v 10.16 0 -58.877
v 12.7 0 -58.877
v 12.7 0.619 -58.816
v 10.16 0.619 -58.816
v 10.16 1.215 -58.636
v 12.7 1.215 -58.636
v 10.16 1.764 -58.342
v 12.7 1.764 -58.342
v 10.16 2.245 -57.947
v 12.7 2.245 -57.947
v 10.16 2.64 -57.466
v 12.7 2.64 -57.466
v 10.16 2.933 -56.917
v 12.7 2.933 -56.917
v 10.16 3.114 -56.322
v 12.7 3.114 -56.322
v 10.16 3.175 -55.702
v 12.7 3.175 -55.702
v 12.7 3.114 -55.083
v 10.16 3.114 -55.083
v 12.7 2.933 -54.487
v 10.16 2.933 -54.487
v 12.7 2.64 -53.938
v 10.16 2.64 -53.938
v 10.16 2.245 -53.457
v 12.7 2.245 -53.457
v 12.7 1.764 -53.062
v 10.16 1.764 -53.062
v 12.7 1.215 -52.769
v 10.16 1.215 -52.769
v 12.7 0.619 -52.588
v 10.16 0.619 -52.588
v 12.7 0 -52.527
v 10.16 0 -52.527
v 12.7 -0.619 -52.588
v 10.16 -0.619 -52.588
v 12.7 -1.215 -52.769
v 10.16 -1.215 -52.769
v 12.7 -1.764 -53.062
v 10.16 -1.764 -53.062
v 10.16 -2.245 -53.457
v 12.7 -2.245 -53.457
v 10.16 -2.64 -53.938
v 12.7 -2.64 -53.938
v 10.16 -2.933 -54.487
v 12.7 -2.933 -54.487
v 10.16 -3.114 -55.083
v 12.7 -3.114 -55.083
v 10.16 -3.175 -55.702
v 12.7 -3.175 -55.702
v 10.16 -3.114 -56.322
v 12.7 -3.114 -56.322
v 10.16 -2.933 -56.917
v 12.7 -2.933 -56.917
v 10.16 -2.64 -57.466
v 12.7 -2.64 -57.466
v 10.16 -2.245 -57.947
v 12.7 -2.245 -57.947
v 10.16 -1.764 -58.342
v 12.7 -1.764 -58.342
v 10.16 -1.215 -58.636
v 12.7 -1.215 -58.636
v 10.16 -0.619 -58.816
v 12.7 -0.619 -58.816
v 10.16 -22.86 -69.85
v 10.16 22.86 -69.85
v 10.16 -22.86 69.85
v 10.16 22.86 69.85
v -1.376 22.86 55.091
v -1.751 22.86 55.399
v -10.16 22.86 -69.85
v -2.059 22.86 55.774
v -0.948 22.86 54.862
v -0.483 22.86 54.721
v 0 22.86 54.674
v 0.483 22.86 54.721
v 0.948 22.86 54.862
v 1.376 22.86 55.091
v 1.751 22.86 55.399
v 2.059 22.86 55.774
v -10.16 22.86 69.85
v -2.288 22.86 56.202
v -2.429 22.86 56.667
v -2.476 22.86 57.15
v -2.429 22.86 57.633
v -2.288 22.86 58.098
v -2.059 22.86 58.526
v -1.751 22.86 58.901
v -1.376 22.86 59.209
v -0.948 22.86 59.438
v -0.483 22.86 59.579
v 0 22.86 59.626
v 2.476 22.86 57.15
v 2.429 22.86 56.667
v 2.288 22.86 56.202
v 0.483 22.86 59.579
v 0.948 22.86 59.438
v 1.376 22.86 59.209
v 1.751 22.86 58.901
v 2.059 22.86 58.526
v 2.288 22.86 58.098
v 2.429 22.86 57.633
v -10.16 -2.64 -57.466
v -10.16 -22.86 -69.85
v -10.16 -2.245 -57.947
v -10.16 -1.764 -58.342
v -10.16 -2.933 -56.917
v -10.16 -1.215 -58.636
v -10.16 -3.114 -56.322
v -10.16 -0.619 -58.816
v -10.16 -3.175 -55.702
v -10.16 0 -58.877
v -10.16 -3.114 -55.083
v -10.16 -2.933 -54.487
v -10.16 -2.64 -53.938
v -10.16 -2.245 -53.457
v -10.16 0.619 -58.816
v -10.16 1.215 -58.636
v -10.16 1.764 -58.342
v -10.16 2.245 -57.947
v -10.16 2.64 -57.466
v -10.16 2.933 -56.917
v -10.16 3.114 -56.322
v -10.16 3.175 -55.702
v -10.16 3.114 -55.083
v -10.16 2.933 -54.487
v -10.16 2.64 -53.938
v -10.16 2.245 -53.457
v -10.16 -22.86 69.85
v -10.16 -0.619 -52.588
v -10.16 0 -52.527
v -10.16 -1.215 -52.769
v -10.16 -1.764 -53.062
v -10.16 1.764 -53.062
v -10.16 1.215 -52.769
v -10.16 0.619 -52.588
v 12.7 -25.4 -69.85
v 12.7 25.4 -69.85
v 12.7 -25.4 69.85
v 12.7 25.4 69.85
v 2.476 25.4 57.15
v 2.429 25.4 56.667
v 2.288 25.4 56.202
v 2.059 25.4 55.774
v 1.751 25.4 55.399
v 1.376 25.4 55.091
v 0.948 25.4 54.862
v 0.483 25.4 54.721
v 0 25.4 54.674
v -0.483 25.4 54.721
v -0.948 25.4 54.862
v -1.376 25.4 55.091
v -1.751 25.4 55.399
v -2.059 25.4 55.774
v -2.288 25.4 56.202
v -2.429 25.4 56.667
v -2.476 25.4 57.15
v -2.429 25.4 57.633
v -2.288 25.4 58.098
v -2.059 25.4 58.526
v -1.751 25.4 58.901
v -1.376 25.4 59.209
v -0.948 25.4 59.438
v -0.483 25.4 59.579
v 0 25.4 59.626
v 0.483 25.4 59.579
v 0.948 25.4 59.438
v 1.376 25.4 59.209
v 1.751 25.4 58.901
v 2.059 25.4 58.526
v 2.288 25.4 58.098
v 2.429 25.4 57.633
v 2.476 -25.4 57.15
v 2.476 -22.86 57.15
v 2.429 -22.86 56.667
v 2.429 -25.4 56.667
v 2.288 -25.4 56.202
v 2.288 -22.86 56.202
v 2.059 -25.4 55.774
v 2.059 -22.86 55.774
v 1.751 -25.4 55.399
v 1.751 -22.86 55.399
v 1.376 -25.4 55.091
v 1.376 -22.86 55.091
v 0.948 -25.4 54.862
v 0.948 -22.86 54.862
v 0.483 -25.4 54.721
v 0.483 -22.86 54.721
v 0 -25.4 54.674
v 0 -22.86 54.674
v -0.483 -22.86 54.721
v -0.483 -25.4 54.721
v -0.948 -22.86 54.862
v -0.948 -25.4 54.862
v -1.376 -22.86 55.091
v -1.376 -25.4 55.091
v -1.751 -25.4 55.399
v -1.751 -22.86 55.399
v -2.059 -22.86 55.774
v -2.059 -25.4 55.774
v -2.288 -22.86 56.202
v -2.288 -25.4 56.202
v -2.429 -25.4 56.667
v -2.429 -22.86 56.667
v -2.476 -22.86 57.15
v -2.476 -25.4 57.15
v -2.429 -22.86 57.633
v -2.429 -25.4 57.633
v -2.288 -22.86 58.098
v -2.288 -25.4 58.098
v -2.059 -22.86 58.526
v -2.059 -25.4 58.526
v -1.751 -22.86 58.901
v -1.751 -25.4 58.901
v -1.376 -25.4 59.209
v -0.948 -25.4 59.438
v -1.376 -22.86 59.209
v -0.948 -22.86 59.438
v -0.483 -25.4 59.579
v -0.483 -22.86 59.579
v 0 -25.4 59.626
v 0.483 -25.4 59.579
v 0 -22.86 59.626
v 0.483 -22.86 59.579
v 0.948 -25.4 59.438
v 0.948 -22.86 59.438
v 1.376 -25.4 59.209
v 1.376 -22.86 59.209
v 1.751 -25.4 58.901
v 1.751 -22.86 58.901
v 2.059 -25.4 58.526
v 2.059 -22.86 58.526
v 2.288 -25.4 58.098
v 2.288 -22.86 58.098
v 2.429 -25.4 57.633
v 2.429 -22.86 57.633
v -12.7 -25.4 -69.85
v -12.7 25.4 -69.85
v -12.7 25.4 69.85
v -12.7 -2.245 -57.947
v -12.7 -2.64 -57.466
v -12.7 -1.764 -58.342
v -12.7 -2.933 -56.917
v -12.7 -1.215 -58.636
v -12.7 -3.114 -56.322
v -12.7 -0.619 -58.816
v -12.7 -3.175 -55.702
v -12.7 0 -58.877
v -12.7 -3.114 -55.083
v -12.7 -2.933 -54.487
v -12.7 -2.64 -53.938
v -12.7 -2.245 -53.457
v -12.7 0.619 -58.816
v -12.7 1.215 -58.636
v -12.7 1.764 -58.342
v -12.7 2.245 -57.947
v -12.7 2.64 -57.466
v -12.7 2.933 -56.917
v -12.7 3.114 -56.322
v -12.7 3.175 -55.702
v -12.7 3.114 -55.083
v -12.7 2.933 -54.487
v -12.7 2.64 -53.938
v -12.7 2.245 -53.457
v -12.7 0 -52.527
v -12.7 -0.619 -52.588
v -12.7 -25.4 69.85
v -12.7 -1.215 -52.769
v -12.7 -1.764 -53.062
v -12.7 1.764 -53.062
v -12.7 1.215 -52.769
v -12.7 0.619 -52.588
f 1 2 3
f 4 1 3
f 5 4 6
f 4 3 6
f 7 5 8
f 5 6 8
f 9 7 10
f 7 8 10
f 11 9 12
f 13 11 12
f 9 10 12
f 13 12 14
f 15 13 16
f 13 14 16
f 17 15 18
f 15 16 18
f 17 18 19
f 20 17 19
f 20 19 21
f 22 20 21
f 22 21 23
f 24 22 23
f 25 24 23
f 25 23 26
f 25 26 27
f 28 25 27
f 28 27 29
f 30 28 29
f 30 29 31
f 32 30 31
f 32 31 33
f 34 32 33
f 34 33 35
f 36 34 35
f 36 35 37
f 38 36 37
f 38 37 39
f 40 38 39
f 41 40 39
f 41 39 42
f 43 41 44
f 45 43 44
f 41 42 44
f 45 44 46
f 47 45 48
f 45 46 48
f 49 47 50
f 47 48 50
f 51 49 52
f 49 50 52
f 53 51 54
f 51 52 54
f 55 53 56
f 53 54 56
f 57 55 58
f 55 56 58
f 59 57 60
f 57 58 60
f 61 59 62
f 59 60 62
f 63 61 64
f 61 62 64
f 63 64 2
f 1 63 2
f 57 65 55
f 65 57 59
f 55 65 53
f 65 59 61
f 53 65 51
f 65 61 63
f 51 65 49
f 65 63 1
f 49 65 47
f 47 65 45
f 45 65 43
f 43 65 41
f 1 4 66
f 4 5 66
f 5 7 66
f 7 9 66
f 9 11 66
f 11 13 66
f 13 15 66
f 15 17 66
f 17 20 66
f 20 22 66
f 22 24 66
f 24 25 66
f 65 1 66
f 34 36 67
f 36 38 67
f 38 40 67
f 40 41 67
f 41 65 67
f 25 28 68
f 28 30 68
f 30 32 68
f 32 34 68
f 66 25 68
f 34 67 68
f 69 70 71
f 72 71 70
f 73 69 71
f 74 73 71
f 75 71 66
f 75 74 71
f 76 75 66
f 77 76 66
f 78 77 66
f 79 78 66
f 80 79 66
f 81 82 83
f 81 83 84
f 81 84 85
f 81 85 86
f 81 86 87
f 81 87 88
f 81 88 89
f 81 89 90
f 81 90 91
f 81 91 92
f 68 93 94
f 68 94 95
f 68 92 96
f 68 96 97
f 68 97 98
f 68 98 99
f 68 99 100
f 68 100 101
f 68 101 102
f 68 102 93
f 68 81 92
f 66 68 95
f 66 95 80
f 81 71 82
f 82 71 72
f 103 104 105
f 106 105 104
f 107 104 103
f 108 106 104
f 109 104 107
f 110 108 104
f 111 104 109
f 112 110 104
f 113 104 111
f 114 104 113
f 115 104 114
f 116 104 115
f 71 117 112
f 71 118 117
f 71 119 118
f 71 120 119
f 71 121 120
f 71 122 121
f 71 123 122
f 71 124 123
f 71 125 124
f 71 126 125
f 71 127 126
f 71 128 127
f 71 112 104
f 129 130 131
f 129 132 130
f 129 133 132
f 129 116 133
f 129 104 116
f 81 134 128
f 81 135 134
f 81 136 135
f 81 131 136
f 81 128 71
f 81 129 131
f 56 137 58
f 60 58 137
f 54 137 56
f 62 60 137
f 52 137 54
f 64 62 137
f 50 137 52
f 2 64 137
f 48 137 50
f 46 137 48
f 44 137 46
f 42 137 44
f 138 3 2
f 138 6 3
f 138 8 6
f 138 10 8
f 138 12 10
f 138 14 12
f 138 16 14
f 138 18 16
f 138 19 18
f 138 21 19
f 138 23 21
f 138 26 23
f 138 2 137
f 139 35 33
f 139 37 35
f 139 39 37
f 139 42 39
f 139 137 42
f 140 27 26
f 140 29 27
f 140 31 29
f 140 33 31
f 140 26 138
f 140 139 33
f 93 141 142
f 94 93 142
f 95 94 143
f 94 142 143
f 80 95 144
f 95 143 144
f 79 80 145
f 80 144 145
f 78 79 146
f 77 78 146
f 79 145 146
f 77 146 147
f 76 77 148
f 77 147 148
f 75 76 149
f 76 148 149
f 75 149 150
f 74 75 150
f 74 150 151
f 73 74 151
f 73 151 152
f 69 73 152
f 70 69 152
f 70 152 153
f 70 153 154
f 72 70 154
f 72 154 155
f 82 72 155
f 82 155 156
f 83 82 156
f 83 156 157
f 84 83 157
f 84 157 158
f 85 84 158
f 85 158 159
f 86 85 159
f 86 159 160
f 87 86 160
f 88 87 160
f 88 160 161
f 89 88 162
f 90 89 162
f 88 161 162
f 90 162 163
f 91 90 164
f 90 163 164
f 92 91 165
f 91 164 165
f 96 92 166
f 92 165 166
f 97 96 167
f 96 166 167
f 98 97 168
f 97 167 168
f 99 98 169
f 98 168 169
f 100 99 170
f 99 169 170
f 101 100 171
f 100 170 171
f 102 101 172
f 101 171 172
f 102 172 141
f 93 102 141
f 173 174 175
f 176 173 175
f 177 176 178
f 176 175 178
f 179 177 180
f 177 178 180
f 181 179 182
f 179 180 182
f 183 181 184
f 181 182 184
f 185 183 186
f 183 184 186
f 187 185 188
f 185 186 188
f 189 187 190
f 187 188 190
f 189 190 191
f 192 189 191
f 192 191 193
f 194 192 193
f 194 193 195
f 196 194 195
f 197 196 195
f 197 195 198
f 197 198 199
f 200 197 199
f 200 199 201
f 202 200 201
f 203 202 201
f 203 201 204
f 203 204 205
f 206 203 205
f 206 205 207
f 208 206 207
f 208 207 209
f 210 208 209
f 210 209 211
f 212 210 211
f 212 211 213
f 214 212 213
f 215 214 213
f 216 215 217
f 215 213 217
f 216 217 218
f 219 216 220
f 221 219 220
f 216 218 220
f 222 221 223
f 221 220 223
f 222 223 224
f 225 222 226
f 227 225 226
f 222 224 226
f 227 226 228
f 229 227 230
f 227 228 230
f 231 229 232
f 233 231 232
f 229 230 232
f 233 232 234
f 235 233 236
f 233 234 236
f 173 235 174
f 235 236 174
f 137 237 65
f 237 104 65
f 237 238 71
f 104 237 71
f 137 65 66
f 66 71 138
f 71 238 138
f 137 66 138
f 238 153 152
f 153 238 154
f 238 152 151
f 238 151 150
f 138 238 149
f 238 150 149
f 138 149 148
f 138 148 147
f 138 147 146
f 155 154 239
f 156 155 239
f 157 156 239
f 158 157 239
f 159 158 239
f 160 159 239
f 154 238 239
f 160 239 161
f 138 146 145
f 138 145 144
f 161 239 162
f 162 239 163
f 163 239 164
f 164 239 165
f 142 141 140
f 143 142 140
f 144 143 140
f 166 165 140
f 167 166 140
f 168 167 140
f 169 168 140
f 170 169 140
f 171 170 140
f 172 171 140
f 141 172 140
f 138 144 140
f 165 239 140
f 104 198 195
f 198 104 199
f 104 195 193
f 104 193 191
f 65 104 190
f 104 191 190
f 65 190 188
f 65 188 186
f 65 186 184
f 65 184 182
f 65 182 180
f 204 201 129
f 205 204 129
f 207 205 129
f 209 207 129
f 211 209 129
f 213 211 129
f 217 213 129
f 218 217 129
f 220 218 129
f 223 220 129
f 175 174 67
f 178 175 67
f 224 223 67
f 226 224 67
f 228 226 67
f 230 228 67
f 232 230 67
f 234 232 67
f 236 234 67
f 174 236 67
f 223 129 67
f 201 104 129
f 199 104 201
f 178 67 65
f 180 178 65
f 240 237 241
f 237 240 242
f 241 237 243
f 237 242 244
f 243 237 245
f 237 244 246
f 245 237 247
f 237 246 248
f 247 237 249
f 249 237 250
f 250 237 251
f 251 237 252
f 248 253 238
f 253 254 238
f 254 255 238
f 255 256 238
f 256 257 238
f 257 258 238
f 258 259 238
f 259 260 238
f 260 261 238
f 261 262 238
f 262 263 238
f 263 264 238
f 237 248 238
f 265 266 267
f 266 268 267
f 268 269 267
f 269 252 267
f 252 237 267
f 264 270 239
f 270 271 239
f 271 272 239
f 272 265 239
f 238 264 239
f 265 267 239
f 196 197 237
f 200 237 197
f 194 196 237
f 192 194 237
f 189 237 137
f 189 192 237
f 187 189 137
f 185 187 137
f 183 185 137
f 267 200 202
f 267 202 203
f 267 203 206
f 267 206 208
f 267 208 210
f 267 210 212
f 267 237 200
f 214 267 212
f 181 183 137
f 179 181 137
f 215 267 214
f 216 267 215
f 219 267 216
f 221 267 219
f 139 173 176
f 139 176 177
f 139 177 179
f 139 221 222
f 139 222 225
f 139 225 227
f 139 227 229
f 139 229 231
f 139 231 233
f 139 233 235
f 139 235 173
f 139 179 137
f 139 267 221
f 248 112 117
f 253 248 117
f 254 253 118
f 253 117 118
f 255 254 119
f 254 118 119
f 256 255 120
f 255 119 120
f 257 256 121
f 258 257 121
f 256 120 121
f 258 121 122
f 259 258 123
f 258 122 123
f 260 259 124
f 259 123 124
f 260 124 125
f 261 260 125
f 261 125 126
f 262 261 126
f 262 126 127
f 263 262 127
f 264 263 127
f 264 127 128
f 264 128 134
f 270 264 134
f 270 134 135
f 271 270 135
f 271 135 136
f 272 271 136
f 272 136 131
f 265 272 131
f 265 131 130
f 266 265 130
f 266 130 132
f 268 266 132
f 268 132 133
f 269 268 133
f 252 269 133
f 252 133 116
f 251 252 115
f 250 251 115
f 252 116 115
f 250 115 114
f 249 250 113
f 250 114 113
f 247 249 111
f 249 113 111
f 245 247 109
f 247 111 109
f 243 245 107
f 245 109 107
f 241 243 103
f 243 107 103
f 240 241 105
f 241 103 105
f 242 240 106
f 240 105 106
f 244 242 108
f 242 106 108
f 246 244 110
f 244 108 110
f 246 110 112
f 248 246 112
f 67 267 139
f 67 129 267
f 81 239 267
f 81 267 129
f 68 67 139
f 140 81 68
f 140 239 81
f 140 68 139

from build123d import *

# Parameters (mm, degrees)
SKETCH1_W           = 25.4
SKETCH1_H           = 50.8
SKETCH1_W_2         = 20.32
SKETCH1_H_2         = 45.72
EXTRUDE_THIN1_DEPTH = 69.85
SKETCH2_R           = 3.175
CUT_EXTRUDE1_DEPTH  = 26.4
SKETCH4_R           = 2.4765
CUT_EXTRUDE3_DEPTH  = 51.8


with BuildPart() as part:
    # Sketch1 → Extrude-Thin1 (new body, symmetric)
    with BuildSketch(Plane.XY):
        Rectangle(SKETCH1_W, SKETCH1_H)
        Rectangle(SKETCH1_W_2, SKETCH1_H_2, mode=Mode.SUBTRACT)
    extrude(amount=EXTRUDE_THIN1_DEPTH, both=True)

    # Sketch2 → Cut-Extrude1 (cut, through all)
    with BuildSketch(Plane(origin=(12.7, 0, 0), x_dir=(0, 0, -1), z_dir=(1, 0, 0))):
        with Locations((55.7022, 0)):
            Circle(SKETCH2_R)
    extrude(amount=-CUT_EXTRUDE1_DEPTH, mode=Mode.SUBTRACT)

    # Sketch4 → Cut-Extrude3 (cut, through all)
    with BuildSketch(Plane(origin=(0, 25.4, 0), x_dir=(1, 0, 0), z_dir=(0, 1, 0))):
        with Locations((0, -57.15)):
            Circle(SKETCH4_R)
    extrude(amount=-CUT_EXTRUDE3_DEPTH, mode=Mode.SUBTRACT)


solid = part.part
